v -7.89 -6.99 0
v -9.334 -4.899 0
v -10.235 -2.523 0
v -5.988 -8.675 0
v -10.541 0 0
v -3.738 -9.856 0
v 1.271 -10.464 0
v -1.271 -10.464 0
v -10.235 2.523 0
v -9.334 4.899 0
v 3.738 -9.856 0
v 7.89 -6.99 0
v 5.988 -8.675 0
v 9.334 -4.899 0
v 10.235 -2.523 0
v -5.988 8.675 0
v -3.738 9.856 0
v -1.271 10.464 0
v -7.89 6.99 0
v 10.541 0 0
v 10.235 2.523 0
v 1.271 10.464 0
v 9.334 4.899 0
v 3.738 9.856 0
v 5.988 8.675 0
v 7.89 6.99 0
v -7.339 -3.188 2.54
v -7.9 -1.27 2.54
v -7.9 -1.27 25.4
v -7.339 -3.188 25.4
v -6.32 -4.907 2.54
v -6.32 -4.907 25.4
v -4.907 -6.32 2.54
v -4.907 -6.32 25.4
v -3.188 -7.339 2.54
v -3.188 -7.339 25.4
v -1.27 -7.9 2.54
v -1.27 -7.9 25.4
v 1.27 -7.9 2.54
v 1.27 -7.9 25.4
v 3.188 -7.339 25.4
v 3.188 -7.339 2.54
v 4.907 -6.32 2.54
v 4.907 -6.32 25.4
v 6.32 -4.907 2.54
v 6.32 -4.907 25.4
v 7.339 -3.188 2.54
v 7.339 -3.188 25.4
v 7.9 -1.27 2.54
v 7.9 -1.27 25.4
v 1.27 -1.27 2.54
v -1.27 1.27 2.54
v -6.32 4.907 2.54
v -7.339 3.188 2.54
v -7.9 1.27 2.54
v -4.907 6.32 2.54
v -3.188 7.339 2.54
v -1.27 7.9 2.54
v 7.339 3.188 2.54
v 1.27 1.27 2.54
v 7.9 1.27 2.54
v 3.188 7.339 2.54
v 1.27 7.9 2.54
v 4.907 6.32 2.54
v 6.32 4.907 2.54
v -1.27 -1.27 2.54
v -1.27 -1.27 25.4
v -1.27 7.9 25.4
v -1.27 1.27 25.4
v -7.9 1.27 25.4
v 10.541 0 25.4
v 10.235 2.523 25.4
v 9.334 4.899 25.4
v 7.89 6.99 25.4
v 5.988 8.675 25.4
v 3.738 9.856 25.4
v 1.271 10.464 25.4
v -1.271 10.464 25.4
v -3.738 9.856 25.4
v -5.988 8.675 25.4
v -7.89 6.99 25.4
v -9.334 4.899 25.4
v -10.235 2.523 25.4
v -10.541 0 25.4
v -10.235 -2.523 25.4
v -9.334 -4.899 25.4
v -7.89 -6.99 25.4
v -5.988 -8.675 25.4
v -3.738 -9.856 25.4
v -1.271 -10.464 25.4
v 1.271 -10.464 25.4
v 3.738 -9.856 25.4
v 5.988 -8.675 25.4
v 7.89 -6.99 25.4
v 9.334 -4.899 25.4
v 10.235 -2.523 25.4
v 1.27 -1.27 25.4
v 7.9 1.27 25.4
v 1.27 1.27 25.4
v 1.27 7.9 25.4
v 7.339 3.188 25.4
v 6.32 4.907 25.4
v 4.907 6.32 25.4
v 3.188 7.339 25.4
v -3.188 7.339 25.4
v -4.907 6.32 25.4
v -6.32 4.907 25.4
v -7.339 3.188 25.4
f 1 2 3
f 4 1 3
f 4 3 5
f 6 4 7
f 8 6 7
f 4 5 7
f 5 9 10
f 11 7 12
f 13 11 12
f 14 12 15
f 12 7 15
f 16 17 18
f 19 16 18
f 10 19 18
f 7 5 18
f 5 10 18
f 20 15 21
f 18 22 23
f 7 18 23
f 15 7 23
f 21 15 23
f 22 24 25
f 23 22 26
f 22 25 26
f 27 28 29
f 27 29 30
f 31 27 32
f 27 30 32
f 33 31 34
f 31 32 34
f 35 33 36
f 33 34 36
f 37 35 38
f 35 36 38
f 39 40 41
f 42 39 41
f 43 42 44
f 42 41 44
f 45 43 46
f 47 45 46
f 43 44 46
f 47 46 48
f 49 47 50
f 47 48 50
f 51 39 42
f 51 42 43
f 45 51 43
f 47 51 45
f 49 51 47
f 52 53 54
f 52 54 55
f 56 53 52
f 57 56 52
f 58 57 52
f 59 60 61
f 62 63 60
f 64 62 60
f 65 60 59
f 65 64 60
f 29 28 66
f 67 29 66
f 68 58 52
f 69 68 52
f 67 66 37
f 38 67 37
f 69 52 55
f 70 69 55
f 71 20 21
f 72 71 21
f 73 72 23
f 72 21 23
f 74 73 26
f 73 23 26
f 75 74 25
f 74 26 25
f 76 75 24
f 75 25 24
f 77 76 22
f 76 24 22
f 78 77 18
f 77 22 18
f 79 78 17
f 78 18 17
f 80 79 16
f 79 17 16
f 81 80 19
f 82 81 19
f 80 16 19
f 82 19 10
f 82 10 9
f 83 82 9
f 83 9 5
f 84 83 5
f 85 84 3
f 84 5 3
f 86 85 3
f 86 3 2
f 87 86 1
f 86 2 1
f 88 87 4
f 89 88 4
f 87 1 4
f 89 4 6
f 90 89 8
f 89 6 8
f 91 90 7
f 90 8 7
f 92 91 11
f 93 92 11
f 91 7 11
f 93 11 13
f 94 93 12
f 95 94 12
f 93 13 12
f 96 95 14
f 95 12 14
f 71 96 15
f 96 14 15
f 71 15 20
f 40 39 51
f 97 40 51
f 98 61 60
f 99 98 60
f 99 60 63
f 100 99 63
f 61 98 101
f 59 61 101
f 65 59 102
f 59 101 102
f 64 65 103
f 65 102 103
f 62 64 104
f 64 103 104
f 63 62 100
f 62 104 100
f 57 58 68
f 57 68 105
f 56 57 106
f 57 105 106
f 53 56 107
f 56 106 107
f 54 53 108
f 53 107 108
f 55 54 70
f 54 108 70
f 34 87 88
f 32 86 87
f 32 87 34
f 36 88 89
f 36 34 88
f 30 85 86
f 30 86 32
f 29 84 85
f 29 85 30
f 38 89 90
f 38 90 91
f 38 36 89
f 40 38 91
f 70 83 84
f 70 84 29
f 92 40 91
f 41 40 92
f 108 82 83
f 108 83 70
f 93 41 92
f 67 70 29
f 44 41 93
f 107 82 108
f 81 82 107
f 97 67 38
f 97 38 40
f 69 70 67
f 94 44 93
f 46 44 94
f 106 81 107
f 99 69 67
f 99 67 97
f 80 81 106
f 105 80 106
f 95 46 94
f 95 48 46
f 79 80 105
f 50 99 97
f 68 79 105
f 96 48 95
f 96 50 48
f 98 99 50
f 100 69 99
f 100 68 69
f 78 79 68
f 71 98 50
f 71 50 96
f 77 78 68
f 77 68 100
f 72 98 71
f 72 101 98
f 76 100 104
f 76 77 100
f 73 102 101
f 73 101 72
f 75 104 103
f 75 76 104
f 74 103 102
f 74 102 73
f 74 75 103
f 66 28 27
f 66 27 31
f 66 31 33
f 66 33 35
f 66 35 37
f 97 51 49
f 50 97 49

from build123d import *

# Parameters (mm, degrees)
F0_R     = 10.541
F1_DEPTH = 25.4
F2_R     = 8.001
F3_DEPTH = 22.86
F4_W     = 2.54
F4_H     = 2.54
F5_DEPTH = 22.86


with BuildPart() as f1:
    # F0 (on Top) → F1 (new body)
    with BuildSketch(Plane.XY):
        Circle(F0_R)
    extrude(amount=F1_DEPTH)

    # F2 (on face) → F3 (cut)
    with BuildSketch(Plane.XY.offset(25.4)):
        Circle(F2_R)
    extrude(amount=-F3_DEPTH, mode=Mode.SUBTRACT)

    # F4 (on face) → F5 (join)
    with BuildSketch(Plane.XY.offset(2.54)):
        Rectangle(F4_W, F4_H)
        with BuildLine():
            Line((1.27, 1.27), (1.27, -1.27))
            Line((1.27, -1.27), (7.8995633424, -1.27))
            ThreePointArc((7.8995633424, -1.27), (7.9756005198, -0.6370222515), (8.001, 0))
            ThreePointArc((8.001, 0), (7.9756005198, 0.6370222515), (7.8995633424, 1.27))
            Line((7.8995633424, 1.27), (1.27, 1.27))
        make_face()
        with BuildLine():
            Line((-1.27, -1.27), (-1.27, -7.8995633424))
            ThreePointArc((-1.27, -7.8995633424), (0, -8.001), (1.27, -7.8995633424))
            Line((1.27, -7.8995633424), (1.27, -1.27))
            Line((1.27, -1.27), (-1.27, -1.27))
        make_face()
        with BuildLine():
            Line((-7.8995633424, -1.27), (-1.27, -1.27))
            Line((-1.27, -1.27), (-1.27, 1.27))
            Line((-1.27, 1.27), (-7.8995633424, 1.27))
            ThreePointArc((-7.8995633424, 1.27), (-8.001, 0), (-7.8995633424, -1.27))
        make_face()
        with BuildLine():
            Line((-1.27, 7.8995633424), (-1.27, 1.27))
            Line((-1.27, 1.27), (1.27, 1.27))
            Line((1.27, 1.27), (1.27, 7.8995633424))
            ThreePointArc((1.27, 7.8995633424), (0, 8.001), (-1.27, 7.8995633424))
        make_face()
    extrude(amount=F5_DEPTH)


solid = f1.part
